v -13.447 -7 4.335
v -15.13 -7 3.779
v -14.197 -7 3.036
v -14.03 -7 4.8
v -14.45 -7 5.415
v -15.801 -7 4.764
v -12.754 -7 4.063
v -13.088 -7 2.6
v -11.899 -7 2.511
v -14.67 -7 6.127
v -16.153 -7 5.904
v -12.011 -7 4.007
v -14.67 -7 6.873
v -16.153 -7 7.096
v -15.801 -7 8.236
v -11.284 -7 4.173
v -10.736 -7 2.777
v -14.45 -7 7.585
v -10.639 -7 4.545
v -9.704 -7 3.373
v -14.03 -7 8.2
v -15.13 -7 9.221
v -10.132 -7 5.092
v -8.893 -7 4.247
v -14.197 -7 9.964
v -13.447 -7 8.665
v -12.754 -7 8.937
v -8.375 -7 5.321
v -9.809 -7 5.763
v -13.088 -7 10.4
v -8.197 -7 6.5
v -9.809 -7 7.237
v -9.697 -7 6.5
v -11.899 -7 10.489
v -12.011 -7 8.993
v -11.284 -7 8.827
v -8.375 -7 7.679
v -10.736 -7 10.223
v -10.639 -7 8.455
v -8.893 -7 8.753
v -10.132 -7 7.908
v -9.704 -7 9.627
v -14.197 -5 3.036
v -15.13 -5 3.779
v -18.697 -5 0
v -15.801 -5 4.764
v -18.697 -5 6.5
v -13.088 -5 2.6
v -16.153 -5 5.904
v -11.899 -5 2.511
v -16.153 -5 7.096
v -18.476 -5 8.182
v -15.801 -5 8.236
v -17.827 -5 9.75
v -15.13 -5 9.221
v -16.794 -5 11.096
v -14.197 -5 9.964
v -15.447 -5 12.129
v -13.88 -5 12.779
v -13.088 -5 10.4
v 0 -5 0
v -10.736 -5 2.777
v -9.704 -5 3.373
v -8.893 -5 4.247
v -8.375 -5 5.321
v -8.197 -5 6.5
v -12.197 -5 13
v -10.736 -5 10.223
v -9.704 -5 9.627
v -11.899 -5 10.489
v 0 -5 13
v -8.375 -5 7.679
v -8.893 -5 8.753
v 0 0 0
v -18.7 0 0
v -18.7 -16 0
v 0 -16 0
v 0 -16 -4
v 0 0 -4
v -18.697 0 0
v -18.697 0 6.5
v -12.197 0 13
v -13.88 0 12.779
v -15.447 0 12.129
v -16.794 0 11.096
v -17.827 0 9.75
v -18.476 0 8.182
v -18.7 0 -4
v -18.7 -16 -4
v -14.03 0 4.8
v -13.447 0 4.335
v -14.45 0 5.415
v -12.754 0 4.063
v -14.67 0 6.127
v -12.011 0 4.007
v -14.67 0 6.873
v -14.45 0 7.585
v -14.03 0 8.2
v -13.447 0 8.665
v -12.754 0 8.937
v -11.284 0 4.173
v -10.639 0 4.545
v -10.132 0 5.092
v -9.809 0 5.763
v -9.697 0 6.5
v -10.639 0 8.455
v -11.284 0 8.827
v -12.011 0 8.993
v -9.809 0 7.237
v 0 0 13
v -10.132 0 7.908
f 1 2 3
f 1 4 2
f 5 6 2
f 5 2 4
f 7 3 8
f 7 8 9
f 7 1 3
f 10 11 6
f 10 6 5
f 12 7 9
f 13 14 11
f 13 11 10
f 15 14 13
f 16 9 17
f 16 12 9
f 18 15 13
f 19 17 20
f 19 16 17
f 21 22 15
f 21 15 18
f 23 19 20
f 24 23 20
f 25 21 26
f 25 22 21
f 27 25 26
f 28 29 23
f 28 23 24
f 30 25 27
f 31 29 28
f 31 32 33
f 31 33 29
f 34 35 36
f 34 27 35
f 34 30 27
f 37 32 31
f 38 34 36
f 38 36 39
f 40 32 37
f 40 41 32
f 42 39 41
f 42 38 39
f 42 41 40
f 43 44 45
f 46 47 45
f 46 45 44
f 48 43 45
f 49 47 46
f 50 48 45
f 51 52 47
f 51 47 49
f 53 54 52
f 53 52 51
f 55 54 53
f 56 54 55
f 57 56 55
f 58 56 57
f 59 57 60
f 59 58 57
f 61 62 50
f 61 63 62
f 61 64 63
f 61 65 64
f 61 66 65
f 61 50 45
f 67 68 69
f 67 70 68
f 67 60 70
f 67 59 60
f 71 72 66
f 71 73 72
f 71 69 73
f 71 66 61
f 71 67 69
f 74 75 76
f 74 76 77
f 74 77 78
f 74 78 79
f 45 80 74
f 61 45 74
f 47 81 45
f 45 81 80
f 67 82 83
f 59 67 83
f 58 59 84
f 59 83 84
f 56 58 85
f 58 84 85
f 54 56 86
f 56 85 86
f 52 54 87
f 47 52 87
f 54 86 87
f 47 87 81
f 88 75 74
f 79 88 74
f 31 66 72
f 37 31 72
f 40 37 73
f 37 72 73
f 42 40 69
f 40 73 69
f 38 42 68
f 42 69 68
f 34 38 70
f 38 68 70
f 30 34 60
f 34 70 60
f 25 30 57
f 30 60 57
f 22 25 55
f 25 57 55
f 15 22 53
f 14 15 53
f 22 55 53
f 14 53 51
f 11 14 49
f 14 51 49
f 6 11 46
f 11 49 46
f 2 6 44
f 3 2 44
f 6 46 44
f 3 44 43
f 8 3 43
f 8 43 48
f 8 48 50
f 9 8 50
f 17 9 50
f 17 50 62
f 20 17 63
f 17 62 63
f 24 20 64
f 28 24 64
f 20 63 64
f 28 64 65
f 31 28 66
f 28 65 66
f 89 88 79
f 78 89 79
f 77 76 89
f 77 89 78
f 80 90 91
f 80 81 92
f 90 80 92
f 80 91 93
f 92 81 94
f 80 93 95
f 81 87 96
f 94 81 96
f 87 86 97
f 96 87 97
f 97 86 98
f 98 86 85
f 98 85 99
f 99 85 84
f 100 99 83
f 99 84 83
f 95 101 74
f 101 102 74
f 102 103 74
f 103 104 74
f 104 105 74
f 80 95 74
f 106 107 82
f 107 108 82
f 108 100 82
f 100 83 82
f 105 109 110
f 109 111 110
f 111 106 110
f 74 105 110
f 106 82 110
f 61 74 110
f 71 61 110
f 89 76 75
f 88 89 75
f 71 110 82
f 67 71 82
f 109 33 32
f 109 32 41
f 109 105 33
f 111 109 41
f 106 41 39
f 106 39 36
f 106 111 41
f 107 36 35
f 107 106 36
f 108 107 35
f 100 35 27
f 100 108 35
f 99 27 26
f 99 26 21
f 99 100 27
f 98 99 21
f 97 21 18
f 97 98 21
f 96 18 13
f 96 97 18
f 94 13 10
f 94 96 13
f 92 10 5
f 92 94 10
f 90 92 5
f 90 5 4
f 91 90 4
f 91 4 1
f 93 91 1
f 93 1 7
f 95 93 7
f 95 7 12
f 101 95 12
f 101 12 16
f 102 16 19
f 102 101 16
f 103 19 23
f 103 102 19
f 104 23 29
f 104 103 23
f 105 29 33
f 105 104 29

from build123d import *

# Parameters (mm, degrees)
F0_R     = 2.5
F1_DEPTH = 5
F2_R     = 4
F2_R_2   = 2.5
F3_DEPTH = 2
F4_W     = 18.7
F4_H     = 16
F5_DEPTH = 4


with BuildPart() as f1:
    # F0 (on Front) → F1 (new body)
    with BuildSketch(Plane.XZ):
        with BuildLine():
            Line((-12.197495, 0), (0, 0))
            Line((0, 0), (0, 13))
            Line((0, 13), (-12.197495, 13))
            ThreePointArc((-12.197495, 13), (-16.793689, 11.096194), (-18.697495, 6.5))
            Line((-18.697495, 6.5), (-18.697495, 0))
            Line((-18.697495, 0), (-12.197495, 0))
        make_face()
        with Locations((-12.197495, 6.5)):
            Circle(F0_R, mode=Mode.SUBTRACT)
    extrude(amount=F1_DEPTH)

    # F2 (on face) → F3 (join)
    with BuildSketch(Plane.XZ.offset(5)):
        with Locations((-12.197495, 6.5)):
            Circle(F2_R)
        with Locations((-12.197495, 6.5)):
            Circle(F2_R_2, mode=Mode.SUBTRACT)
    extrude(amount=F3_DEPTH)


with BuildPart() as f5:
    # F4 (on Top) → F5 (new body)
    with BuildSketch(Plane.XY):
        with Locations((-9.35, -8)):
            Rectangle(F4_W, F4_H)
    extrude(amount=-F5_DEPTH)


solid = Compound([f1.part, f5.part])
